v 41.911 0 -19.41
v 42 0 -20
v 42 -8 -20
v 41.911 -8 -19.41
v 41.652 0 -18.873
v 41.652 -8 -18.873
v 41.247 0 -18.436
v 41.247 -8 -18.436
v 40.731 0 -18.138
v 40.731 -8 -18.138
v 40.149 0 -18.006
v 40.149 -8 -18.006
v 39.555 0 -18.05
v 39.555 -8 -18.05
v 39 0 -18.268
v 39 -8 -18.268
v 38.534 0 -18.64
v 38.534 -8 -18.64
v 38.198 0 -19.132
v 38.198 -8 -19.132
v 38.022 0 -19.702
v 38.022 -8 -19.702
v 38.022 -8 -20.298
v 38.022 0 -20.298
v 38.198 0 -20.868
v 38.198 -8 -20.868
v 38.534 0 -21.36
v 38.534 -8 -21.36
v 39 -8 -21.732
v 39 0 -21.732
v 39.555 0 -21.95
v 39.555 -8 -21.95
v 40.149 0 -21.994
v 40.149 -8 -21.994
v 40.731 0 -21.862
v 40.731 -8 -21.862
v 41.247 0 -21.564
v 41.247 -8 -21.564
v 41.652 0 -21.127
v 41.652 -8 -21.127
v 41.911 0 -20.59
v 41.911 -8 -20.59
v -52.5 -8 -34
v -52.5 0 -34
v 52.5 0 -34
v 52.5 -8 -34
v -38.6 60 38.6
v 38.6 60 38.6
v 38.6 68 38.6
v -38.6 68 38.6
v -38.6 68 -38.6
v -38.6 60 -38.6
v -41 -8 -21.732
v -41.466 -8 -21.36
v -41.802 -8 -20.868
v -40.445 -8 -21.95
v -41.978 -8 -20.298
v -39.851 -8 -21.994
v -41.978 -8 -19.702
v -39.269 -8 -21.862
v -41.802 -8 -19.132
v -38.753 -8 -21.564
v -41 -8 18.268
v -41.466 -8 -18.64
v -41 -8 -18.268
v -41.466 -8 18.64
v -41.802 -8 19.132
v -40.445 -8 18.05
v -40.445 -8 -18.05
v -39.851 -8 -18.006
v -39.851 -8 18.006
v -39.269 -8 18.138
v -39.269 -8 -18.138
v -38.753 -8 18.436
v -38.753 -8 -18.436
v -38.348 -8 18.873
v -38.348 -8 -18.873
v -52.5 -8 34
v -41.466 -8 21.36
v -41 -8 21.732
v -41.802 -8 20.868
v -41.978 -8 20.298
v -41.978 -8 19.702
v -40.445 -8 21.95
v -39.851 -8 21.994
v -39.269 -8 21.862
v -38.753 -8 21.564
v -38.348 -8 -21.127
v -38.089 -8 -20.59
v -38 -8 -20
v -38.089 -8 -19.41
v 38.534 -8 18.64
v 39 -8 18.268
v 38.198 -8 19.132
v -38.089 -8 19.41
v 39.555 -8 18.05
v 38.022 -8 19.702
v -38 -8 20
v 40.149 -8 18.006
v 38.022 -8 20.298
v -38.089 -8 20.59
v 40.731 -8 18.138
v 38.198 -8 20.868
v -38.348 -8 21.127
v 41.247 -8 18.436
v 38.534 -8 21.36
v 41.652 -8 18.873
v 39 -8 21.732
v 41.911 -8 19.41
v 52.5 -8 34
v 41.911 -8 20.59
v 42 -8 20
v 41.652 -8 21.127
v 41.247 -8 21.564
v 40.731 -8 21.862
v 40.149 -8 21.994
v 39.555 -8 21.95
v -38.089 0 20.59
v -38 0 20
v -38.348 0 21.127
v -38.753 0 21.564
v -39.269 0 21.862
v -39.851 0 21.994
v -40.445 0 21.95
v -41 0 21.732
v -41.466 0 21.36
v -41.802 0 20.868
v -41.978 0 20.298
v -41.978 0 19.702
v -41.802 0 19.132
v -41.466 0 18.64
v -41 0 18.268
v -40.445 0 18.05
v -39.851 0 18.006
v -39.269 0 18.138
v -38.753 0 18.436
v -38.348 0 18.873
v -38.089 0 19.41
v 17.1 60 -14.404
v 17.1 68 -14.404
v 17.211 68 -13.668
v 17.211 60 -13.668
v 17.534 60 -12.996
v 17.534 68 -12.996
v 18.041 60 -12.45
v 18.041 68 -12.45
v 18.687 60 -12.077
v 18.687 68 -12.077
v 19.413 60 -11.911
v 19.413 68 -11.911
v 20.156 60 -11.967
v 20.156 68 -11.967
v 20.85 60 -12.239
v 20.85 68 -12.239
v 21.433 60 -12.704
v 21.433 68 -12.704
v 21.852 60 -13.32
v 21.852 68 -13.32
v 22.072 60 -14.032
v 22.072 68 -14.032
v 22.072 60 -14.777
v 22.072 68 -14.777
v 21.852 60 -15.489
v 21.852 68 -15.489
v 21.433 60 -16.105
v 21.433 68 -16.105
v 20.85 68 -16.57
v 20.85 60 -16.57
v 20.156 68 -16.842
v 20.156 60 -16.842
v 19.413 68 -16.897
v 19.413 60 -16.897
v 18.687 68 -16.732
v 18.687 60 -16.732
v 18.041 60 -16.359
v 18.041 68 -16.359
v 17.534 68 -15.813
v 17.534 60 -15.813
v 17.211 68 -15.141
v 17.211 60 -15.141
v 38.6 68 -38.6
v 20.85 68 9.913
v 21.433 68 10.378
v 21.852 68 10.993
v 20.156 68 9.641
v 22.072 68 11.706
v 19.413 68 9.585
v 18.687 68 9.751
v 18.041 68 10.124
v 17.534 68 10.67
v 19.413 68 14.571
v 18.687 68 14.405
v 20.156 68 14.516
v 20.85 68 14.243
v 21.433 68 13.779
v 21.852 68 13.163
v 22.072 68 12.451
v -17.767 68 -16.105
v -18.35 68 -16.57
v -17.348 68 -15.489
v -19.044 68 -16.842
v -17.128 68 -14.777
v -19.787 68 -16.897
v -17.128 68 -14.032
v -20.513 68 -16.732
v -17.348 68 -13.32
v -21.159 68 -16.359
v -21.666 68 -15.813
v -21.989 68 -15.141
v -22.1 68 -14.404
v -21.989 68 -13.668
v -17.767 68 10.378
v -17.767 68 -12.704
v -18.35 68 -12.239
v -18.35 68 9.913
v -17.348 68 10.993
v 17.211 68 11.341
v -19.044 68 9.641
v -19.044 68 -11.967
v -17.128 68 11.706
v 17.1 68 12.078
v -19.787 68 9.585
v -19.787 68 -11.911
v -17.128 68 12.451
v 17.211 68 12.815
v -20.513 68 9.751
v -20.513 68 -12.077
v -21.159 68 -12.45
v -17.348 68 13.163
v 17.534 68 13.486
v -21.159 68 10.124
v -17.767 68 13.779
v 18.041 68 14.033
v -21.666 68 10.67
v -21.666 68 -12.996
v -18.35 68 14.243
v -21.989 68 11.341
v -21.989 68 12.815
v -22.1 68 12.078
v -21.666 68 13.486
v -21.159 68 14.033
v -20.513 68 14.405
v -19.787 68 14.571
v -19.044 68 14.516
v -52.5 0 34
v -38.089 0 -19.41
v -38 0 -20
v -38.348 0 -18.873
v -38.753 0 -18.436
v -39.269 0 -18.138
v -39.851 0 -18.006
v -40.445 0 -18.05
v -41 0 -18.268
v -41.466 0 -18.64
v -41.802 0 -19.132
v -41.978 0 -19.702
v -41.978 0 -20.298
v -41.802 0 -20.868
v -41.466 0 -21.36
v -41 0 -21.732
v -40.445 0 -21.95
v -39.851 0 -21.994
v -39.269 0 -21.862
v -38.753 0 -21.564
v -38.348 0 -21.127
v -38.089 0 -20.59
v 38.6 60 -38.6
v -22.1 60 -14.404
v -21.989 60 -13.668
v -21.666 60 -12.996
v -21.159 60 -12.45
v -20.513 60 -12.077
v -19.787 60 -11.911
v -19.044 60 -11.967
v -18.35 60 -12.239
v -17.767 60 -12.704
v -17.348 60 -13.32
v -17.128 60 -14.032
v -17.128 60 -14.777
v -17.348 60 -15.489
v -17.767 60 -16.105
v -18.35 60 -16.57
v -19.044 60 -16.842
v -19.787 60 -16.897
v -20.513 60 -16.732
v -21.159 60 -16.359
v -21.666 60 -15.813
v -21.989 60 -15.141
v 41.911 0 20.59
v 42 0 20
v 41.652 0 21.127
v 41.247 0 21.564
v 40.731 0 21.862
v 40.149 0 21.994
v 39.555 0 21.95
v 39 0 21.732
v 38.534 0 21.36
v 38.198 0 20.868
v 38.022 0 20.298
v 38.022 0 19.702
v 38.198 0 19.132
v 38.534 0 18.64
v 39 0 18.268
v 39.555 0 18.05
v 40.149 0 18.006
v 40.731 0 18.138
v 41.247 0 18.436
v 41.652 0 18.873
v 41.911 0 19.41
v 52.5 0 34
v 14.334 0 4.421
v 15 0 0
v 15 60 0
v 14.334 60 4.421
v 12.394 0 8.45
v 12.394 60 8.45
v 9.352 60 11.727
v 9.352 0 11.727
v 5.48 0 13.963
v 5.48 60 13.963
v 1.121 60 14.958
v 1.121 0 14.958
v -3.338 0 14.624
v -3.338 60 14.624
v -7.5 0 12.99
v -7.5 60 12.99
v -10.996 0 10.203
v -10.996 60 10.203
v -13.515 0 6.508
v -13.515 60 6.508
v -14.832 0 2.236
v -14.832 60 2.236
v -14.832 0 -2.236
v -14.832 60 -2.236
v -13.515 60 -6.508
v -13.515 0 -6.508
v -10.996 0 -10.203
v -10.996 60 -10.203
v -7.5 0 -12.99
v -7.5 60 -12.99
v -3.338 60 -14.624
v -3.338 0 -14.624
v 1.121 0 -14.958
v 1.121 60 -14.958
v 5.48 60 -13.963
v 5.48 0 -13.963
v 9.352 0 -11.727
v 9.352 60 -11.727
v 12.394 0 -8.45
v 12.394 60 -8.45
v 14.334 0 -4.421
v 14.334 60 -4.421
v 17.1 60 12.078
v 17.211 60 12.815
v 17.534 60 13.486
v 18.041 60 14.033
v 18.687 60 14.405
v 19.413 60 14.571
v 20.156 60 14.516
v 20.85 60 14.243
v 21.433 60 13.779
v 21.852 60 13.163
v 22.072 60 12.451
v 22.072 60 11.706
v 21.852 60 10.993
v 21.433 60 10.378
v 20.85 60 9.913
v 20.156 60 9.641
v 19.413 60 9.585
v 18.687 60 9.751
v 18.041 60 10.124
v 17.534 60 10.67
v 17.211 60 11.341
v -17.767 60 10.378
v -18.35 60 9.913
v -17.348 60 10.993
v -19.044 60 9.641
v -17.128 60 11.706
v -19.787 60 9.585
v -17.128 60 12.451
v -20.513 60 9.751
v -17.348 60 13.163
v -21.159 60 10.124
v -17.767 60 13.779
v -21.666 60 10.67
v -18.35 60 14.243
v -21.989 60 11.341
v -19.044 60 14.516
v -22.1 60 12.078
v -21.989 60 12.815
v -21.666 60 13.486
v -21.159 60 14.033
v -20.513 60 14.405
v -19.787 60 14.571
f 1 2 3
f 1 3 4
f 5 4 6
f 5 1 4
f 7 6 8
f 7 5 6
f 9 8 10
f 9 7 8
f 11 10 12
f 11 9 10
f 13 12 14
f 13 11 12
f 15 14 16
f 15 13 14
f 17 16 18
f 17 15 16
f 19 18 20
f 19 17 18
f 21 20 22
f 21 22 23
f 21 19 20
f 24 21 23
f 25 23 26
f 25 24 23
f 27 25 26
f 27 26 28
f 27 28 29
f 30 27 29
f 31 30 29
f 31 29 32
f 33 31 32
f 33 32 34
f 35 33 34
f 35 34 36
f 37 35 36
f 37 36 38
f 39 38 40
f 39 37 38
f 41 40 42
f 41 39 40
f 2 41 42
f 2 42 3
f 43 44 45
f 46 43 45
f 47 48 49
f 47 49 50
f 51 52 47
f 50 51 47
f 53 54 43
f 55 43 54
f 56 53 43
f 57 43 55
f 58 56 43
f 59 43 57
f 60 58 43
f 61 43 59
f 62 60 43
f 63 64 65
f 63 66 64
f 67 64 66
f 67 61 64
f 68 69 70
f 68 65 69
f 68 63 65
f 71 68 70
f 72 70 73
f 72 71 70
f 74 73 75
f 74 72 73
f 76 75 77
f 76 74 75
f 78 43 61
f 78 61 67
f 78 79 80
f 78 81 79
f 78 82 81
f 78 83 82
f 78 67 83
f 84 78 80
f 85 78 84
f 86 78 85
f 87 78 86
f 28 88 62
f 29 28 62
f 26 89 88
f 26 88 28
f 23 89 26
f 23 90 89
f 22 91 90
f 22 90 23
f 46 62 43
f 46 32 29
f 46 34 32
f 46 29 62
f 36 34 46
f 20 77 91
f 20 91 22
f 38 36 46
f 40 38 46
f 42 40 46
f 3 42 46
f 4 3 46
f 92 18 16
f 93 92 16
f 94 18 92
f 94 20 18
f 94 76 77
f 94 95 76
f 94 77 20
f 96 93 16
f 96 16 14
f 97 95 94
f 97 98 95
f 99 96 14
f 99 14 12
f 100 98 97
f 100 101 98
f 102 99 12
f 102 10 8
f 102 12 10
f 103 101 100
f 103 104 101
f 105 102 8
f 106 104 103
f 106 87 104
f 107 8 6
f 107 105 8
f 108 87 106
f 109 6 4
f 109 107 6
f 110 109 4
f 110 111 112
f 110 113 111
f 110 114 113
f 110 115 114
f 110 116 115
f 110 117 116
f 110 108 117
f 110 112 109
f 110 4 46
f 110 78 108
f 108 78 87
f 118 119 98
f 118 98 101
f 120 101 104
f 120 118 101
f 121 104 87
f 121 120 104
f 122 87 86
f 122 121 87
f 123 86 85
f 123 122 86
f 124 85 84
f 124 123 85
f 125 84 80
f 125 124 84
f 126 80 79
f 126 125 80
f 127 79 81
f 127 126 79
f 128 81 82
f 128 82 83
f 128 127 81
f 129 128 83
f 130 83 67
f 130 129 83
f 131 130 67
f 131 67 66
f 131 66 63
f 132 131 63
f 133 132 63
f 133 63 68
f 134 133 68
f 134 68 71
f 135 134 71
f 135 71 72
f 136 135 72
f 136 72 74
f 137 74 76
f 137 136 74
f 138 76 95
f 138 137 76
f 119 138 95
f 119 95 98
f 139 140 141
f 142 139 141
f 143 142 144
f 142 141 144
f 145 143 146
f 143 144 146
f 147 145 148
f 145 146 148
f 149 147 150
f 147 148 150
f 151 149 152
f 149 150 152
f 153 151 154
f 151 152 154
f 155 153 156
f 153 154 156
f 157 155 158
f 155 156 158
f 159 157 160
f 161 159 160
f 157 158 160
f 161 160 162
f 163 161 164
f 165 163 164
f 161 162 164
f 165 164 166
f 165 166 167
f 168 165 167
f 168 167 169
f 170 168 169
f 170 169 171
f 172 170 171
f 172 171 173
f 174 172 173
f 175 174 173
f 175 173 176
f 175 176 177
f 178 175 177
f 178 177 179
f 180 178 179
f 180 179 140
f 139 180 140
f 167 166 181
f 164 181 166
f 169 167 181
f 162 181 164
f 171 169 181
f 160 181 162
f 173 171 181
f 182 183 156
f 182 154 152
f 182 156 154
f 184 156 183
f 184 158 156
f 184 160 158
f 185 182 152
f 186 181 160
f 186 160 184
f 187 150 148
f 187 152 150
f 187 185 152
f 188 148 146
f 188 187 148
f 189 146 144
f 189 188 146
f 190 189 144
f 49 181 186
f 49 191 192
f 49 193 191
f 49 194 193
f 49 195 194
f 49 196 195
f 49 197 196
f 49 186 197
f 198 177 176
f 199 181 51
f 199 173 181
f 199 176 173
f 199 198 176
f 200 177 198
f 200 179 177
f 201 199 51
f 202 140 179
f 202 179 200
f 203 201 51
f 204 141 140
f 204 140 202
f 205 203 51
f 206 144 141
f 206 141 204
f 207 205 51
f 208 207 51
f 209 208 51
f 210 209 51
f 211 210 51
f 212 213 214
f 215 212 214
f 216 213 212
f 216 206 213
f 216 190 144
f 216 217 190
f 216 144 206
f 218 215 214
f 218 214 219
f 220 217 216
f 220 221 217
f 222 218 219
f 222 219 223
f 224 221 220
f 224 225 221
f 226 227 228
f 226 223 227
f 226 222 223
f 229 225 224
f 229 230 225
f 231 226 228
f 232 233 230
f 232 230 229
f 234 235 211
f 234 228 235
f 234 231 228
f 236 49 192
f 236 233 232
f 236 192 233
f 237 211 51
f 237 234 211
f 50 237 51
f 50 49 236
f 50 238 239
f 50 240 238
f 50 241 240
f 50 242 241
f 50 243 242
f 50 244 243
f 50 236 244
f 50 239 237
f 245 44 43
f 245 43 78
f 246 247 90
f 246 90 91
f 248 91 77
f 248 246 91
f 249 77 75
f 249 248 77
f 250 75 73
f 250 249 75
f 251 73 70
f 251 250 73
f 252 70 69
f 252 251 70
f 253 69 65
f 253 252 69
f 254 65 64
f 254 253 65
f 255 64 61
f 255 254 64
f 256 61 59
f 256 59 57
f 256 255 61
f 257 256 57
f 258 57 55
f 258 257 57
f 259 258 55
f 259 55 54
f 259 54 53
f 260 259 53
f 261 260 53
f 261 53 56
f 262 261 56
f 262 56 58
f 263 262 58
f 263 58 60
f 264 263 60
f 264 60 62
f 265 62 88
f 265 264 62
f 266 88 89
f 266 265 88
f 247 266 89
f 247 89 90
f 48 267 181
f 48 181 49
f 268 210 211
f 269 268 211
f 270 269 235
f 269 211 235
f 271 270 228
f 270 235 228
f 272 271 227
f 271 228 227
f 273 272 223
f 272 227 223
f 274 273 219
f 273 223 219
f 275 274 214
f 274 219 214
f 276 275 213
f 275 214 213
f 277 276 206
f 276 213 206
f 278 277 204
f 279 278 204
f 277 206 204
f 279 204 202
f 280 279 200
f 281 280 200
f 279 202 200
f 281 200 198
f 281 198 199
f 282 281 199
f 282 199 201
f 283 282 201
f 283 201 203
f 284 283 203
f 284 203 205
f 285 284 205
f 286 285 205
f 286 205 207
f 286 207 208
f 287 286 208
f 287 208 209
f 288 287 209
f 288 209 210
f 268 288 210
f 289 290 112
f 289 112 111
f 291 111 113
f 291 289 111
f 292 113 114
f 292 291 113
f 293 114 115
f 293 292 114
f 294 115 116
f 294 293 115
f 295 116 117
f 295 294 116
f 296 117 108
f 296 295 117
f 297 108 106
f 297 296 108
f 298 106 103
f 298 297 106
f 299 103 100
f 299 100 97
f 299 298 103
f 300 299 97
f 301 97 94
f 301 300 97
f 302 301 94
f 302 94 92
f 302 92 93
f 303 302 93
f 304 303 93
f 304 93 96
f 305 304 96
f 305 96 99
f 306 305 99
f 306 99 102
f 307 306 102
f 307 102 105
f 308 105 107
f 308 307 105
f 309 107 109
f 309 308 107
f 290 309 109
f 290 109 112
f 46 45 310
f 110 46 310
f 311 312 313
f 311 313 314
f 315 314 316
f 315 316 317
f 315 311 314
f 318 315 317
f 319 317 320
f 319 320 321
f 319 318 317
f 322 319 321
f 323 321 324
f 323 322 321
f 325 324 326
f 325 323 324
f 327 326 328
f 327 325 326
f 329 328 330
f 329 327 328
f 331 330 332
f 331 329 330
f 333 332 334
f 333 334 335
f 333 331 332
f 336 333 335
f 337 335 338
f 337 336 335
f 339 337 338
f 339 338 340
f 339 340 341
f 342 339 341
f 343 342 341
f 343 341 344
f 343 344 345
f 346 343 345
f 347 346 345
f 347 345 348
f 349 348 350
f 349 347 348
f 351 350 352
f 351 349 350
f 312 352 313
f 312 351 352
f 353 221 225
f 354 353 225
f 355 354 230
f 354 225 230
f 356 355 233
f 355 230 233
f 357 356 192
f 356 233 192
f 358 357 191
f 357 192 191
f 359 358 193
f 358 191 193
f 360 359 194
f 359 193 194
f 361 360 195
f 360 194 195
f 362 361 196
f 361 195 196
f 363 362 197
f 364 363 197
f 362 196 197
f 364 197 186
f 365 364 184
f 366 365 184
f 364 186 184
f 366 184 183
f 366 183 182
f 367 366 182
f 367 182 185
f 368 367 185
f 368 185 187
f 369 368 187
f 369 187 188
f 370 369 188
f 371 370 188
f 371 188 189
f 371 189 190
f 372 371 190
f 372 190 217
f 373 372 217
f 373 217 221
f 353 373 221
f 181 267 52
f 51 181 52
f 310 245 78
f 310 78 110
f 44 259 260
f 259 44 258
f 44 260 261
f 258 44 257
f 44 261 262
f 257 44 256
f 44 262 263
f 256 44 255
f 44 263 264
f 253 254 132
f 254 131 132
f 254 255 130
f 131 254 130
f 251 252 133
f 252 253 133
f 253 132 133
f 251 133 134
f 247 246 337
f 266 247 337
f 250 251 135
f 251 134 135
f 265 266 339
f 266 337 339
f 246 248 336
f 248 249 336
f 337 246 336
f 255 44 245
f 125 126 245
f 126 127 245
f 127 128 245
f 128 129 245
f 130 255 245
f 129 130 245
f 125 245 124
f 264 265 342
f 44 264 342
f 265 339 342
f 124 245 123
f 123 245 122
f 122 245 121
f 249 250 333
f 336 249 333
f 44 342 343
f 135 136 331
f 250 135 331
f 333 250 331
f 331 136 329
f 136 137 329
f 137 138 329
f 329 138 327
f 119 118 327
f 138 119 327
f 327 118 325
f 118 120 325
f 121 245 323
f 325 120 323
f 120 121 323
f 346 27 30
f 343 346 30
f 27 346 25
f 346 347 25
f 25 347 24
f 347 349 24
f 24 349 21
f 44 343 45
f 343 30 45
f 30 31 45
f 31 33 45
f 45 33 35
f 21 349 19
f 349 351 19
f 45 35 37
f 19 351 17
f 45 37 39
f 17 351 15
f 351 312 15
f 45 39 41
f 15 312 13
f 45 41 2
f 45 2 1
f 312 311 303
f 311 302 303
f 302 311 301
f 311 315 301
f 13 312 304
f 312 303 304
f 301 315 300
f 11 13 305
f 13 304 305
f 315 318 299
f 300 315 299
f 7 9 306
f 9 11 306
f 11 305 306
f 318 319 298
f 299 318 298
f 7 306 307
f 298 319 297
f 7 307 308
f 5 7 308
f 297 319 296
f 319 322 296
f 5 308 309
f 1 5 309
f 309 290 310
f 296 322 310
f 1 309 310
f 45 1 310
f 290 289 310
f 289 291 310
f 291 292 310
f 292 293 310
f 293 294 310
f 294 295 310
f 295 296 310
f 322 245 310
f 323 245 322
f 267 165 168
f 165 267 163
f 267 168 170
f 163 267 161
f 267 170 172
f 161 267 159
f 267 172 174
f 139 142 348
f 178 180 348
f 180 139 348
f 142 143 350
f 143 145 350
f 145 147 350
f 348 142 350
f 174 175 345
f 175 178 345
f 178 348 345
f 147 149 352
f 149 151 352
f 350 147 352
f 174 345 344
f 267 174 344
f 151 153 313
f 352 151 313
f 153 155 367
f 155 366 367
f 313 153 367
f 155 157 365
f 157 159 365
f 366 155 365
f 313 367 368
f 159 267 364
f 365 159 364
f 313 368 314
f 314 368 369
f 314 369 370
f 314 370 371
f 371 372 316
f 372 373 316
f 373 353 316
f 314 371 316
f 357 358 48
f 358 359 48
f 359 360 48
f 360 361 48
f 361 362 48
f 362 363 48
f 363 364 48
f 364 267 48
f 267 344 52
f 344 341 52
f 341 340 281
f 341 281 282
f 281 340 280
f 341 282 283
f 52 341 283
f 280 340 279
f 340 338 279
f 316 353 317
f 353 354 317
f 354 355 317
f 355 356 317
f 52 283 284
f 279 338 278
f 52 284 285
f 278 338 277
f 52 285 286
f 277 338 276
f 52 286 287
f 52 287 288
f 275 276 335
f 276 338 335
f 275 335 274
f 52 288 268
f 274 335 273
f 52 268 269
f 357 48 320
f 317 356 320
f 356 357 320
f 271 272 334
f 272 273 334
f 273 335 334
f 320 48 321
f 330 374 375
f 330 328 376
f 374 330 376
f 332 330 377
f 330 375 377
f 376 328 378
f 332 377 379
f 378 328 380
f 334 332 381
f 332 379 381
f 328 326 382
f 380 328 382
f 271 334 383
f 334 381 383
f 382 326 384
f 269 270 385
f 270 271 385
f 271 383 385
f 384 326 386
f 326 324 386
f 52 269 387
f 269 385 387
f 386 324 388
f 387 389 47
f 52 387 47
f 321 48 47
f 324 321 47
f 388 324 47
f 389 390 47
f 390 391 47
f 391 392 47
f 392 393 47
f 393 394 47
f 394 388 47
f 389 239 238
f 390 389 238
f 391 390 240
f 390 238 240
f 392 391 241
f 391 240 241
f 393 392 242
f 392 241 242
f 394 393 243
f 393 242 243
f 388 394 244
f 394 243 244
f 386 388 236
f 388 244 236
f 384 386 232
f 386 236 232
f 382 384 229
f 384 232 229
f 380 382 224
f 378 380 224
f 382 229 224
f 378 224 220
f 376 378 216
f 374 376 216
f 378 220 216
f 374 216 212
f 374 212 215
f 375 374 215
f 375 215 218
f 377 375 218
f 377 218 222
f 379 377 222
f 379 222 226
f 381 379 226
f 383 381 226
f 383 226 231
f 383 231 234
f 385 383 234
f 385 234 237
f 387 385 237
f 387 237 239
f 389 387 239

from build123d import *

# Parameters (mm, degrees)
F0_W     = 105
F0_H     = 68
F0_R     = 2
F1_DEPTH = 8
F2_R     = 15
F3_DEPTH = 60
F4_W     = 77.2
F4_H     = 77.2
F5_DEPTH = 8
F6_R     = 2.5
F7_DEPTH = 44.4


with BuildPart() as f1:
    # F0 (on Front) → F1 (new body)
    with BuildSketch(Plane.XZ):
        Rectangle(F0_W, F0_H)
        with Locations((-40, -20)):
            Circle(F0_R, mode=Mode.SUBTRACT)
        with Locations((40, -20)):
            Circle(F0_R, mode=Mode.SUBTRACT)
        with Locations((-40, 20)):
            Circle(F0_R, mode=Mode.SUBTRACT)
        with Locations((40, 20)):
            Circle(F0_R, mode=Mode.SUBTRACT)
    extrude(amount=F1_DEPTH)

    # F2 (on Front) → F3 (join)
    with BuildSketch(Plane.XZ):
        Circle(F2_R)
    extrude(amount=-F3_DEPTH)

    # F4 (on face) → F5 (join)
    with BuildSketch(Plane(origin=(0, 60, 0), x_dir=(-1, 0, 0), z_dir=(0, 1, 0))):
        Rectangle(F4_W, F4_H)
    extrude(amount=F5_DEPTH)

    # F6 (on face) → F7 (cut)
    with BuildSketch(Plane(origin=(0, 68, 0), x_dir=(-1, 0, 0), z_dir=(0, 1, 0))):
        with Locations((-19.6, 12.078193)):
            Circle(F6_R)
        with Locations((-19.6, -14.40448)):
            Circle(F6_R)
        with Locations((19.6, -14.40448)):
            Circle(F6_R)
        with Locations((19.6, 12.078193)):
            Circle(F6_R)
    extrude(amount=-F7_DEPTH, mode=Mode.SUBTRACT)


solid = f1.part
